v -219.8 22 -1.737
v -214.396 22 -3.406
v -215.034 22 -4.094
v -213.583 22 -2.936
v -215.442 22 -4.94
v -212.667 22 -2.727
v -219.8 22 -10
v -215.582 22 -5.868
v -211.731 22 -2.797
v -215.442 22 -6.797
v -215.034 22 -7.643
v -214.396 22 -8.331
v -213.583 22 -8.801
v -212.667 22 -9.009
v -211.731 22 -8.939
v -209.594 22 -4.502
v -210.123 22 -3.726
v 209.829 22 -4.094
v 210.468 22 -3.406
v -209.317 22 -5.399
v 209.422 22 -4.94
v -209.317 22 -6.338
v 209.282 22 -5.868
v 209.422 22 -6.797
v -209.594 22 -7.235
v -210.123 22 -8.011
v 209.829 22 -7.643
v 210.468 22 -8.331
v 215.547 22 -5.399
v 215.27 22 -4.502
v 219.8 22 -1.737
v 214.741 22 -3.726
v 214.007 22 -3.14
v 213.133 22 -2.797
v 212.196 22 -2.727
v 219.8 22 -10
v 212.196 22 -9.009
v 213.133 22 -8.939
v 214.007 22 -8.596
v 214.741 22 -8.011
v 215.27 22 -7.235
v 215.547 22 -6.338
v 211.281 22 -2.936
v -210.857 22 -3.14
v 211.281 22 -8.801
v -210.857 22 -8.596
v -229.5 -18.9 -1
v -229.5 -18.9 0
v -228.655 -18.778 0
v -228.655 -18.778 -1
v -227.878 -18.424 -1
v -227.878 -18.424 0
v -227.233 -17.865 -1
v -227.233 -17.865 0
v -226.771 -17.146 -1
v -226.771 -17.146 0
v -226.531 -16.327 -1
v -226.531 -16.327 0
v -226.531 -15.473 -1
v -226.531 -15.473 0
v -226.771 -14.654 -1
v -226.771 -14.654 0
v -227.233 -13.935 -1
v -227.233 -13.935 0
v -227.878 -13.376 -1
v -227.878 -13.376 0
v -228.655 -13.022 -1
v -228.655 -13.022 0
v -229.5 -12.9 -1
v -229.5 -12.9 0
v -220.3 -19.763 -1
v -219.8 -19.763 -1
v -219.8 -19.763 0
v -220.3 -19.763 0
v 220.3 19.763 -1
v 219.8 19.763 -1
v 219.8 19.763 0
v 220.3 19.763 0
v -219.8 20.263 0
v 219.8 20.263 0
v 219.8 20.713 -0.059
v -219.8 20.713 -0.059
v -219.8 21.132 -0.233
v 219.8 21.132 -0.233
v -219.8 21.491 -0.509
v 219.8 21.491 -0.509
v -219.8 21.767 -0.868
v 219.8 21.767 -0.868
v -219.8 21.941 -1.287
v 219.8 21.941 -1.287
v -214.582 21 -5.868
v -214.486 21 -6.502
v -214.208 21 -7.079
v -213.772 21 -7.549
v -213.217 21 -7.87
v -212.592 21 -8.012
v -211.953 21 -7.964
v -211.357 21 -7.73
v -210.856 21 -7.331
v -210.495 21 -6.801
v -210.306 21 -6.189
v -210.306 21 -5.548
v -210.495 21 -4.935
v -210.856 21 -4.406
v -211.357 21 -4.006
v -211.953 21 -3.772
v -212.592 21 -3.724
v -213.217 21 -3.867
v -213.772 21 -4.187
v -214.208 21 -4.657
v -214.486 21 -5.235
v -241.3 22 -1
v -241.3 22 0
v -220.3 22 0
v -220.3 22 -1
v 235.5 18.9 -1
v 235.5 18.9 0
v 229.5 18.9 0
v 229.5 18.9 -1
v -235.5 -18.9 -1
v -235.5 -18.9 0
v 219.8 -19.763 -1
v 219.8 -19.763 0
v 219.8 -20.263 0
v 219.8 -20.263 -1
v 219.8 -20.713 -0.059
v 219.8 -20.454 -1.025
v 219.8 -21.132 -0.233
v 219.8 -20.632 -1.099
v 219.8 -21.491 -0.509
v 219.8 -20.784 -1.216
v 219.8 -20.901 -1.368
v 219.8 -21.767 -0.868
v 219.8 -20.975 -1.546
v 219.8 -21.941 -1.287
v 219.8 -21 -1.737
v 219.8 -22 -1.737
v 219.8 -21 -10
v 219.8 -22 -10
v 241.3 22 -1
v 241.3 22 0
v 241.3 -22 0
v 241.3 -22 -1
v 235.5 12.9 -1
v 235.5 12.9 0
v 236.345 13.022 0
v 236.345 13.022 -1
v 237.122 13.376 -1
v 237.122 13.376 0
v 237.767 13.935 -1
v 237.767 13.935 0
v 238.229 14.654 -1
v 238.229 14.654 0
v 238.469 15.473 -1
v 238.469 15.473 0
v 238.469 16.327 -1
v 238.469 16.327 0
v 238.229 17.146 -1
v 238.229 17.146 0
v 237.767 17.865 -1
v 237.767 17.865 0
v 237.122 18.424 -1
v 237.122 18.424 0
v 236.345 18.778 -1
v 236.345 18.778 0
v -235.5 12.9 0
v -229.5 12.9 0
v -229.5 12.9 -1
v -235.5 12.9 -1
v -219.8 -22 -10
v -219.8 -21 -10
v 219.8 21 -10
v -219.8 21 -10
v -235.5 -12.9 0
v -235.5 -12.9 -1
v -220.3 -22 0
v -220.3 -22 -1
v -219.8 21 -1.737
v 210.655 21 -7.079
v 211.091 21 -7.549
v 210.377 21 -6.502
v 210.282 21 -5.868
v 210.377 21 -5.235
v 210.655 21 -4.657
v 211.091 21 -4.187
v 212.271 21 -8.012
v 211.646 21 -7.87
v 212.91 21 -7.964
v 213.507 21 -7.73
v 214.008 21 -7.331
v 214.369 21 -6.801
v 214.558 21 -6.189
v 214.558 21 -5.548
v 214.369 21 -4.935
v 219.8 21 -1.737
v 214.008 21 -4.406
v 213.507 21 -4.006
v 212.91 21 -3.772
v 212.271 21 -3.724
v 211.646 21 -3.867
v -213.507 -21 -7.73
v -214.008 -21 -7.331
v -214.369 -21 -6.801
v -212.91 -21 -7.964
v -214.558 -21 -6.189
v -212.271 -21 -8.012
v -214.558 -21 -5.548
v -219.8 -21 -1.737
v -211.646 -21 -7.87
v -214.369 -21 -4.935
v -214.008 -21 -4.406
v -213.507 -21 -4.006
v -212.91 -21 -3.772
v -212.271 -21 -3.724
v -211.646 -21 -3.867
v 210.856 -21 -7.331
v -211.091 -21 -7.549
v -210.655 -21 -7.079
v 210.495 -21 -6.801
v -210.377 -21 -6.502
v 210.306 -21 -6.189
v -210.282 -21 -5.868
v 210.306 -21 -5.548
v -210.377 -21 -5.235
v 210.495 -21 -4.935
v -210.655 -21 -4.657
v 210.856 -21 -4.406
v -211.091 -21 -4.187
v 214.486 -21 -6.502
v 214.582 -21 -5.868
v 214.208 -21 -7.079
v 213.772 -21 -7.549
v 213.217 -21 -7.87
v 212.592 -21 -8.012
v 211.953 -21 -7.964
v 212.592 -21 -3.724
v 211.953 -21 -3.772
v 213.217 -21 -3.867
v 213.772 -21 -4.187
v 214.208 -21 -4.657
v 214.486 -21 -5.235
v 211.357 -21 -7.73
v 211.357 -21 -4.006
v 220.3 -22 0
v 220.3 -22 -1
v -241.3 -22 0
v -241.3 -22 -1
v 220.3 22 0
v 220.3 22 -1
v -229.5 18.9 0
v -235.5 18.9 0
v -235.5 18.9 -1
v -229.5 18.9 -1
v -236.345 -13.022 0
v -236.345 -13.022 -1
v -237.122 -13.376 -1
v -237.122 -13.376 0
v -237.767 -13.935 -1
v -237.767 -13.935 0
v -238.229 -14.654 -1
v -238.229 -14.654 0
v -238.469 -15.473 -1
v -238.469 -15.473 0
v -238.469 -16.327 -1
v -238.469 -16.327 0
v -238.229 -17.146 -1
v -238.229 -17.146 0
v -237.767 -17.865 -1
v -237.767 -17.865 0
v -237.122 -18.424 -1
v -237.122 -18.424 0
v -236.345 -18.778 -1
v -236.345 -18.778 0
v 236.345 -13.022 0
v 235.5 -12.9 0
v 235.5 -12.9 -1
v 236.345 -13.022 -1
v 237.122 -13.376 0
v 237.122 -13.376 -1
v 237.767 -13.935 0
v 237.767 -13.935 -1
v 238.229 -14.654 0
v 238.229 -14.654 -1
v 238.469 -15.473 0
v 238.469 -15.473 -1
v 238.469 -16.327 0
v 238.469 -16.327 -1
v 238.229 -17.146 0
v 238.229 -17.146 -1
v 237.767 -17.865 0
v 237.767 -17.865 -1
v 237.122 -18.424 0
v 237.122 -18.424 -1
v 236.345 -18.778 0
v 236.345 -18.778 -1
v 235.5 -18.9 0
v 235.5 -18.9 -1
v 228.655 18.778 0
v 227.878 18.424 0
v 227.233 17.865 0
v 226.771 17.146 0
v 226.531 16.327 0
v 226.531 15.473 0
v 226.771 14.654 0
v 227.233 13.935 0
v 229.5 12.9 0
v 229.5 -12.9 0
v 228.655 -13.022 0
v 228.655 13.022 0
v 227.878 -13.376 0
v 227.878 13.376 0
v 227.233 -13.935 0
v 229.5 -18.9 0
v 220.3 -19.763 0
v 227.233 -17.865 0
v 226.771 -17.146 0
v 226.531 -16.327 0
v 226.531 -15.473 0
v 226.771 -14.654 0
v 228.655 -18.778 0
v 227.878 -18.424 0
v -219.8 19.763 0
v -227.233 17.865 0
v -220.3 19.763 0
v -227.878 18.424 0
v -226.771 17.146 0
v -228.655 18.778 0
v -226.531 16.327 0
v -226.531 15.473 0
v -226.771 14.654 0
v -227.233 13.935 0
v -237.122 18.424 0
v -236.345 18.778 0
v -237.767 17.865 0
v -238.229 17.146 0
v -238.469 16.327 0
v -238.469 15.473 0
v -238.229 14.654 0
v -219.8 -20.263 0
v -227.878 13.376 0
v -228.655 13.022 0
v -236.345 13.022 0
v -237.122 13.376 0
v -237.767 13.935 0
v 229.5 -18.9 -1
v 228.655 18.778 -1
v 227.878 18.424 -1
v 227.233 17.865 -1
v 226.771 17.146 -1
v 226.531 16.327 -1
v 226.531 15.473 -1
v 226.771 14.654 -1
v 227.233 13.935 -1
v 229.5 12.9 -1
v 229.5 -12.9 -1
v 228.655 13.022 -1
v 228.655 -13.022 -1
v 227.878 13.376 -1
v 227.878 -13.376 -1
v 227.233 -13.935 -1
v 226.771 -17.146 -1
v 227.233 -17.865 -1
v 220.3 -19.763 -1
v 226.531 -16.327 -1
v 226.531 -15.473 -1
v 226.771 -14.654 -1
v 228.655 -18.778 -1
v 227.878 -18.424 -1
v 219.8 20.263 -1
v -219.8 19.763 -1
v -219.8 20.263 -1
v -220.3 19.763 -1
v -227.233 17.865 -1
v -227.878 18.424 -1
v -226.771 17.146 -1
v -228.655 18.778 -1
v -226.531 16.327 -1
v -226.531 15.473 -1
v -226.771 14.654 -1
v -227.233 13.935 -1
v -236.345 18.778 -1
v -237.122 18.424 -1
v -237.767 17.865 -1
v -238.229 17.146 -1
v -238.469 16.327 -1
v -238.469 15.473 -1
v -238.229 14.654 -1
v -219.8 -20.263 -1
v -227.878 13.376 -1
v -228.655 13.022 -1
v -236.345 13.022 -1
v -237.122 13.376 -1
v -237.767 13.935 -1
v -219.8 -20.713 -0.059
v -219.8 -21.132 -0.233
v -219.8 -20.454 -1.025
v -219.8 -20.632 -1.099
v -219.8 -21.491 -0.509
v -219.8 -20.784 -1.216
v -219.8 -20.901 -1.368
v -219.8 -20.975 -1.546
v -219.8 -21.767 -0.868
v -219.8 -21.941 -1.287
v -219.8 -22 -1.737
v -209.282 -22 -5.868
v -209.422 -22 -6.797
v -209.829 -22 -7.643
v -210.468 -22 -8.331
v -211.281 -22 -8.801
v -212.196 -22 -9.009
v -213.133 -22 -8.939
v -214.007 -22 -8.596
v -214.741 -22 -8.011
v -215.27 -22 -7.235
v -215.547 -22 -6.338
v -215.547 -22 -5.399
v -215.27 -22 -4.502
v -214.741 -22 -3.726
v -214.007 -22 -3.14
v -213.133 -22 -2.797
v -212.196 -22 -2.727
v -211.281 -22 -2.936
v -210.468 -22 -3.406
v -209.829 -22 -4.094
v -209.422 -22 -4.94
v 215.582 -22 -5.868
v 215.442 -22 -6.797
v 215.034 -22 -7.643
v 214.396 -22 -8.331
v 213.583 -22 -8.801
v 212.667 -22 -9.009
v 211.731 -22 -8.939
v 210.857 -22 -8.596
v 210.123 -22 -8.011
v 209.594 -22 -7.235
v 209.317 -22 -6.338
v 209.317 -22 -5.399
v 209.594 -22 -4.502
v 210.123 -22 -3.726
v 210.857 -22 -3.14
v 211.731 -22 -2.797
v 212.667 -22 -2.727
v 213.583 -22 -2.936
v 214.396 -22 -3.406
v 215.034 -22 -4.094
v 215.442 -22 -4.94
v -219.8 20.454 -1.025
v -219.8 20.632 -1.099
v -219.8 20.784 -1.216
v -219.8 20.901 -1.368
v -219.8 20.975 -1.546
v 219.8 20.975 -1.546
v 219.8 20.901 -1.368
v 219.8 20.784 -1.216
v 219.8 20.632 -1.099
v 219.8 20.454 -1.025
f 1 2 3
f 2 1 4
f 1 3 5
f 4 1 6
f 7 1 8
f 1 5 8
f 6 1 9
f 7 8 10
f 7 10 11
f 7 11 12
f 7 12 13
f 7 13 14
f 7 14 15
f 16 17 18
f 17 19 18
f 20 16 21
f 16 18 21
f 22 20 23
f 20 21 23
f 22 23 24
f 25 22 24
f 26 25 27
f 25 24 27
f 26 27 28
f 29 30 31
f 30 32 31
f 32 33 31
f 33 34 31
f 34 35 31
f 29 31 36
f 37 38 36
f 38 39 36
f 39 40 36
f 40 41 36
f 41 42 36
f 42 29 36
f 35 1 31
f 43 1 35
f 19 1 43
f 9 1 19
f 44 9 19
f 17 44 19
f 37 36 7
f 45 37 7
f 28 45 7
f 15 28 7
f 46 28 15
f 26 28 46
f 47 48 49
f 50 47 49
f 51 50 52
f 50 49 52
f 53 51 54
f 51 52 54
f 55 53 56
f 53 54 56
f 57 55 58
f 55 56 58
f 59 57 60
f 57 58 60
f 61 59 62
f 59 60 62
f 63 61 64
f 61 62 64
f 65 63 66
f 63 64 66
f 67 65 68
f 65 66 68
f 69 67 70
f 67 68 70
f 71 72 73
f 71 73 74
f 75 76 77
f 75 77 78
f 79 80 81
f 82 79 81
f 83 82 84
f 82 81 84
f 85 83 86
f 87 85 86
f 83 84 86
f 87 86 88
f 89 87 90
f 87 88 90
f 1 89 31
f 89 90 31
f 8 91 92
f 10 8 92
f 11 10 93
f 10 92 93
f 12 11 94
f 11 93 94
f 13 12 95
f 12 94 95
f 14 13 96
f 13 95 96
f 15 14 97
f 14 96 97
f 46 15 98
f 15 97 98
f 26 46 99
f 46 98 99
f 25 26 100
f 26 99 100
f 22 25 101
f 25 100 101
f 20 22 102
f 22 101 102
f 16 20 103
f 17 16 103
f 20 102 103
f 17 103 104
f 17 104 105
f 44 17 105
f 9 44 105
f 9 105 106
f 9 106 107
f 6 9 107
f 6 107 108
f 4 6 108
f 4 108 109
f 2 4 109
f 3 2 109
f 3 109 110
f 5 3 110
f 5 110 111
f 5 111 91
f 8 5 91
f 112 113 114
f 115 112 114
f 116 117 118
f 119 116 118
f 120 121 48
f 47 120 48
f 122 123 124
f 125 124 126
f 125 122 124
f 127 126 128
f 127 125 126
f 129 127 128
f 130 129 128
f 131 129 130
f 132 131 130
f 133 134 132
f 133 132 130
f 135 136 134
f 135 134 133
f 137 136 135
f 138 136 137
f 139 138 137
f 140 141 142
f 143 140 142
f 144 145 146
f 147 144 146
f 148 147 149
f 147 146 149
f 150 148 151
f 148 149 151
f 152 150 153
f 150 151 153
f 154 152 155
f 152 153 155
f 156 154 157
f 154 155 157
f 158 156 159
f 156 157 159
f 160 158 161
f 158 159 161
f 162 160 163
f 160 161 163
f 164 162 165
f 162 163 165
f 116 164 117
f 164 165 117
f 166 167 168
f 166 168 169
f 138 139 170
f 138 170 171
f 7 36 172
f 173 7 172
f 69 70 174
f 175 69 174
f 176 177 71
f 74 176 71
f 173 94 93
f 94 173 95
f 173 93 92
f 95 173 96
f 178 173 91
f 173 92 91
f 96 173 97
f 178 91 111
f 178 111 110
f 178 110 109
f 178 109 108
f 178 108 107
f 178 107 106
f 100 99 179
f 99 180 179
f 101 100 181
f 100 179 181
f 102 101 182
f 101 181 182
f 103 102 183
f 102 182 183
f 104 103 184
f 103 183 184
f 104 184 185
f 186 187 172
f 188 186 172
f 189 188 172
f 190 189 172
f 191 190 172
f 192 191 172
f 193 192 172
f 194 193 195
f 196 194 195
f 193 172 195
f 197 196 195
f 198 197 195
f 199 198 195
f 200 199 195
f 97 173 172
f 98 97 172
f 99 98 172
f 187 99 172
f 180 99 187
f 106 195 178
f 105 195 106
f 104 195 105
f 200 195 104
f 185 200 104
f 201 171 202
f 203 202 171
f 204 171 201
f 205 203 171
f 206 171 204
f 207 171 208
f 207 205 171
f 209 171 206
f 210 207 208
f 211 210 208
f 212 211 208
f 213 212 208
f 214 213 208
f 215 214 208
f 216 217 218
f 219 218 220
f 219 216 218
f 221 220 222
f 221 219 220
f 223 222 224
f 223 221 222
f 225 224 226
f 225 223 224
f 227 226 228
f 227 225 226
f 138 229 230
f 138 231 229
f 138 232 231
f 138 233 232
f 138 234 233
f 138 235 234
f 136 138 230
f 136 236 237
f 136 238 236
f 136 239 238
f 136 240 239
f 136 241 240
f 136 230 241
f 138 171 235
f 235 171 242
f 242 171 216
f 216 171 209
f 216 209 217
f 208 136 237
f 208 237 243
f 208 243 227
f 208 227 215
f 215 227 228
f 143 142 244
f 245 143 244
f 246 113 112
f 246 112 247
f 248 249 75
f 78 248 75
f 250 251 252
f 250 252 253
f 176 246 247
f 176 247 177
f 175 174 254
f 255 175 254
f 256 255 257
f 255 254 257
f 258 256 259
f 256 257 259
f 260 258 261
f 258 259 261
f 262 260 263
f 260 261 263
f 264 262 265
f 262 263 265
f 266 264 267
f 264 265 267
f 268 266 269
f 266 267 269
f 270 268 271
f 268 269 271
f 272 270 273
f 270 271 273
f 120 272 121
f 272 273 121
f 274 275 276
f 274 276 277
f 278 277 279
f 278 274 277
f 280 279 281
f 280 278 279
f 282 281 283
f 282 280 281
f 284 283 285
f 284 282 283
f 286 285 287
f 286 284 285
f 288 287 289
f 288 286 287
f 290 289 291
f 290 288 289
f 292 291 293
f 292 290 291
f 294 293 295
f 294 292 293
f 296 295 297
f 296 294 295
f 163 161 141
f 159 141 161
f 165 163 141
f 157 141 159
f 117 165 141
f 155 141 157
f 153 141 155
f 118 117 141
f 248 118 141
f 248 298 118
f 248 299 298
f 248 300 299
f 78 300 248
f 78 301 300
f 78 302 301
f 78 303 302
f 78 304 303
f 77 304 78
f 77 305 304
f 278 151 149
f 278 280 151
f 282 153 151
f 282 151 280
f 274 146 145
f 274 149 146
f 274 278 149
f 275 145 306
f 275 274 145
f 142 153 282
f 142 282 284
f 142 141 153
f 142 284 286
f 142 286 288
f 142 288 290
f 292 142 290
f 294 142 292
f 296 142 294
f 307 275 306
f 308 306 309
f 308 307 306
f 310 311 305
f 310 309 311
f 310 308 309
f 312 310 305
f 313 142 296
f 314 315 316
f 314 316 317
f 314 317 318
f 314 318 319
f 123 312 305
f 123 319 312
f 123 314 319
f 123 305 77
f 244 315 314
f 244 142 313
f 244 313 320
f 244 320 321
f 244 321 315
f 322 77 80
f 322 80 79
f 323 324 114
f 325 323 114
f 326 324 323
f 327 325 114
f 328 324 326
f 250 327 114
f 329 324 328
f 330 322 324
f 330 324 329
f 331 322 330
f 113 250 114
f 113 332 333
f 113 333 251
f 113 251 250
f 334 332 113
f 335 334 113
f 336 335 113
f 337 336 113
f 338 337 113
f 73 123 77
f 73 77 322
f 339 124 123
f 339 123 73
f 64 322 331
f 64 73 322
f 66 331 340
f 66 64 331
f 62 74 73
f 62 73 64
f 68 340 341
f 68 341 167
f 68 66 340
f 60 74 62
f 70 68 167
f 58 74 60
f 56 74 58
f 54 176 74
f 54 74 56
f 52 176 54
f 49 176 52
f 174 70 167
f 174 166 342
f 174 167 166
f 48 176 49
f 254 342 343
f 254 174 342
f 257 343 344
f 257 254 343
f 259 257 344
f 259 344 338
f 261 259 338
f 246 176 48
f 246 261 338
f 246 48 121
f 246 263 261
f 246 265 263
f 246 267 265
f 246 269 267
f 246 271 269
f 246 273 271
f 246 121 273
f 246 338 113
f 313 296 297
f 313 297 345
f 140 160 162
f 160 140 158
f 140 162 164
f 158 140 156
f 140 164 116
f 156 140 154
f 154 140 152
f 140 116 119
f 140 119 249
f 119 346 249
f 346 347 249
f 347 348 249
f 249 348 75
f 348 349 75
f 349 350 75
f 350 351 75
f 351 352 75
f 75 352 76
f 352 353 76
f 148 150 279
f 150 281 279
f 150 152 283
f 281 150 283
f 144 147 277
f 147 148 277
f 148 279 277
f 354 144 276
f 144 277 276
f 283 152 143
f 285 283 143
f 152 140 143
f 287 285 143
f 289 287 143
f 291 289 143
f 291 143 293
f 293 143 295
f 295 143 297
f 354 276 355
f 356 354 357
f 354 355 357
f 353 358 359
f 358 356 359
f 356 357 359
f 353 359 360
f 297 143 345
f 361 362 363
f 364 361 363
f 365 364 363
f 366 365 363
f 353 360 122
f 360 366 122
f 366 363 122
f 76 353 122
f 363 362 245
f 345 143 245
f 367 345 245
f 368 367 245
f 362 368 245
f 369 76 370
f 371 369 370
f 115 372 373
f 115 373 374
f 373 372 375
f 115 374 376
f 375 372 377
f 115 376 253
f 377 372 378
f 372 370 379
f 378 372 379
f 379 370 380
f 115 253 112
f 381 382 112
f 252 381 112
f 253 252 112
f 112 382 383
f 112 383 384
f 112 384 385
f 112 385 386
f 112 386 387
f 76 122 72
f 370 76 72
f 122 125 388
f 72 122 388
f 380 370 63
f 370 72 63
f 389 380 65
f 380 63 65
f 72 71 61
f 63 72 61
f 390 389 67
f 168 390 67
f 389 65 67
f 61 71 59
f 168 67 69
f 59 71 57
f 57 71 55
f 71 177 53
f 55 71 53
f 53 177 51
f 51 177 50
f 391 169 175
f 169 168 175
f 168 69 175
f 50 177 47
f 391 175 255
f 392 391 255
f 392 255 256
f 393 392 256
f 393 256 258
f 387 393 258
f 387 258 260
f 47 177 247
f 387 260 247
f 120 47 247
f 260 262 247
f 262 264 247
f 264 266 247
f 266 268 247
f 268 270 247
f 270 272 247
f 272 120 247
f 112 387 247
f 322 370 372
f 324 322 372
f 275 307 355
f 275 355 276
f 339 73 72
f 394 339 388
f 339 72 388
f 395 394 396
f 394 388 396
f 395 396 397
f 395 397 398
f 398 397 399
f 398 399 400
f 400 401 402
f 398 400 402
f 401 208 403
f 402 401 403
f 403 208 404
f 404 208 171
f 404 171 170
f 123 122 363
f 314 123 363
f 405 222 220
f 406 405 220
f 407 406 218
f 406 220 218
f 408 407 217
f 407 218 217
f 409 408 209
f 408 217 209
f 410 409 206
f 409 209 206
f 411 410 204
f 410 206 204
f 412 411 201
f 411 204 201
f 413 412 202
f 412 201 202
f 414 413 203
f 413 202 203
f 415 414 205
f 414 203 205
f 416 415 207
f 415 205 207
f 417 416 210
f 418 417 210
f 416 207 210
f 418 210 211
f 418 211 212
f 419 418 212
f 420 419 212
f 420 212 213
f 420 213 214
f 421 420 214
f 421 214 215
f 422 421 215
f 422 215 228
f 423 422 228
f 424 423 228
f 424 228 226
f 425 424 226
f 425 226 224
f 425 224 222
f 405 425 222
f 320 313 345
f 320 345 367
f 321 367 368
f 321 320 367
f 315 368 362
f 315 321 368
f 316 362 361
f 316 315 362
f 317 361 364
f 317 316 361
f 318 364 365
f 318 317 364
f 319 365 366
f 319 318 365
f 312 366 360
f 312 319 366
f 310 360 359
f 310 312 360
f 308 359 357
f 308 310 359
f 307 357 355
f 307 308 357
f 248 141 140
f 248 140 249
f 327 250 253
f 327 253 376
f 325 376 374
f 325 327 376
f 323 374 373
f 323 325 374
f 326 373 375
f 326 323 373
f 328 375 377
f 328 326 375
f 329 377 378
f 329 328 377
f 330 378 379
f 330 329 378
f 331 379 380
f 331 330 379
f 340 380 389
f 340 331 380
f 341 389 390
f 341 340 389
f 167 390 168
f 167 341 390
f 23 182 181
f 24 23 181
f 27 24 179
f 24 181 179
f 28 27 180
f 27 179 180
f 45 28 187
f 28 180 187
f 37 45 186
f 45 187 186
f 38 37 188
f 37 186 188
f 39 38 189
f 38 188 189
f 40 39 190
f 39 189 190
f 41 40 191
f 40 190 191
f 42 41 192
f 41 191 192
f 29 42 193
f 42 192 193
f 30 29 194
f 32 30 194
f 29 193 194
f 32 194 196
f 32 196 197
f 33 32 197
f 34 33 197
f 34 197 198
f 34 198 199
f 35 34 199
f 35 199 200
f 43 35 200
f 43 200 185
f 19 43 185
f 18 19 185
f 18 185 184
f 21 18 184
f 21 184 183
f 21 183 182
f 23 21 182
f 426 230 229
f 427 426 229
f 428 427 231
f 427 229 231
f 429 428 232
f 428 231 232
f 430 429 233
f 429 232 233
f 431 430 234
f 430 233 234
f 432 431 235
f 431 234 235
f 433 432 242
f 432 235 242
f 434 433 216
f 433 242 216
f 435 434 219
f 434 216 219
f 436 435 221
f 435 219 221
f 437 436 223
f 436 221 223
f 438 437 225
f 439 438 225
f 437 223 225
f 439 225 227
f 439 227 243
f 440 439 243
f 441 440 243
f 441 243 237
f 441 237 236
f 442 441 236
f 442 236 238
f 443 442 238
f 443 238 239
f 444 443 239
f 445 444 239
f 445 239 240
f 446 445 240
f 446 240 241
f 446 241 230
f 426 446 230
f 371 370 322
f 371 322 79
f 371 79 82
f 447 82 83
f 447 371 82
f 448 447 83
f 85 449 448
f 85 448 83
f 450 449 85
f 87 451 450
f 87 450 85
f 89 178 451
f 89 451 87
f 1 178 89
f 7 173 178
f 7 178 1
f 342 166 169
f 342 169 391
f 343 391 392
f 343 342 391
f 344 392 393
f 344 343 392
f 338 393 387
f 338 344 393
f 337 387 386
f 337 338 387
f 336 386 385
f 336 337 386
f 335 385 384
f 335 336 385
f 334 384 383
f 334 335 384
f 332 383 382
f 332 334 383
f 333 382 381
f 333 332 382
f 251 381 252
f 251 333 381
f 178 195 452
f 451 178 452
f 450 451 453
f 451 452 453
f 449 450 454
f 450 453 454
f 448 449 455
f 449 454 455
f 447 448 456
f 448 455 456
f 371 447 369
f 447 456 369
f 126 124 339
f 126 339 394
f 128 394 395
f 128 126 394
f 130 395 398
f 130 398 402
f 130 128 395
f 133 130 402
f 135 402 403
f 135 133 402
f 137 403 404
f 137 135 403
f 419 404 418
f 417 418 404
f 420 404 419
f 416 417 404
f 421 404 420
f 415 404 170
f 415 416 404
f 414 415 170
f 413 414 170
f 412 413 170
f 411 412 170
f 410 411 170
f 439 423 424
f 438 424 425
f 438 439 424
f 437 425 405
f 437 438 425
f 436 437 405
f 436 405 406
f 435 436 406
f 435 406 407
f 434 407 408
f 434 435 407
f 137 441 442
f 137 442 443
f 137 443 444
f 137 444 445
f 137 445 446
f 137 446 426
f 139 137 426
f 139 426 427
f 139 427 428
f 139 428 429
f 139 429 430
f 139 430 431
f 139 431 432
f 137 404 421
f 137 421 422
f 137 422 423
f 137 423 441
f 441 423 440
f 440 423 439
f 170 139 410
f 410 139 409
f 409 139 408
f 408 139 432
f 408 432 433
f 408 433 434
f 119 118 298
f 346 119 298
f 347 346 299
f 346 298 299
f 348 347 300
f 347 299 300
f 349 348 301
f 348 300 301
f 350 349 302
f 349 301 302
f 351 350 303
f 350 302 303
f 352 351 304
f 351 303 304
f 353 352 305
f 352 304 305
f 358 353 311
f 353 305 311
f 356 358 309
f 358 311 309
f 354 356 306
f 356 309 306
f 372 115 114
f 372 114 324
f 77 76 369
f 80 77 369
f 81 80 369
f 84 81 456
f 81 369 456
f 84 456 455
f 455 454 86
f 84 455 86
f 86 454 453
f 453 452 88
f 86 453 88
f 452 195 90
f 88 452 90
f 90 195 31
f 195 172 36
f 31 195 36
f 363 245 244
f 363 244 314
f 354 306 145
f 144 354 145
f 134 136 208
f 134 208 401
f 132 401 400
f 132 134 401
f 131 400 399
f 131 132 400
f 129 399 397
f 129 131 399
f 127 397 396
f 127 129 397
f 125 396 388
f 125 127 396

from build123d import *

# Parameters (mm, degrees)
SKETCH1_W                                           = 241.3
SKETCH1_H                                           = 22
BASE_FLANGE_DEPTH                                   = 1
EDGE_FLANGE_MOUNING_STRIP_W                         = 5.4732
EDGE_FLANGE_MOUNING_STRIP_H                         = 1
EDGE_FLANGE_MOUNING_STRIP_CUT_DEPTH                 = 219.8
EDGE_FLANGE_MOUNING_RELIEF_W                        = 5.9732
EDGE_FLANGE_MOUNING_RELIEF_H                        = 0.5
EDGE_FLANGE_MOUNING_RELIEF_CUT_DEPTH                = 1
EDGE_FLANGE_MOUNING_DEPTH                           = 219.8
CUT_EXTRUDE_MOUNTING_DEPTH                          = 1
CSK_FOR_M3_COUNTERSUNK_FLAT_HEAD_SCREW5_D           = 3.2
CSK_FOR_M3_COUNTERSUNK_FLAT_HEAD_SCREW5_CSINK_D     = 6.3
CSK_FOR_M3_COUNTERSUNK_FLAT_HEAD_SCREW5_CSINK_ANGLE = 90
CSK_FOR_M3_COUNTERSUNK_FLAT_HEAD_SCREW6_D           = 3.2
CSK_FOR_M3_COUNTERSUNK_FLAT_HEAD_SCREW6_CSINK_D     = 6.3
CSK_FOR_M3_COUNTERSUNK_FLAT_HEAD_SCREW6_CSINK_ANGLE = 90


# Sheet-metal steps are written as plain solids
with BuildPart() as part:
    # Sketch1 → Base-Flange (new body)
    with BuildSketch(Plane.XY):
        with Locations((-120.65, 11)):
            Rectangle(SKETCH1_W, SKETCH1_H)
    extrude(amount=-BASE_FLANGE_DEPTH)

    # Edge-Flange-Mouning strip (across the edge) → Edge-Flange-Mouning strip cut (cut)
    with BuildSketch(Plane(origin=(-219.8, 22, -1), x_dir=(0, -1, 0), z_dir=(1, 0, 0))):
        with Locations((-1, -0.5)):
            Rectangle(EDGE_FLANGE_MOUNING_STRIP_W, EDGE_FLANGE_MOUNING_STRIP_H)
    extrude(amount=EDGE_FLANGE_MOUNING_STRIP_CUT_DEPTH, mode=Mode.SUBTRACT)

    # Edge-Flange-Mouning relief (on the sheet) → Edge-Flange-Mouning relief cut (cut)
    with BuildSketch(Plane(origin=(-219.8, 20.2634, -1), x_dir=(0, -1, 0), z_dir=(0, 0, -1))):
        with Locations((-2.4866, 0.25)):
            Rectangle(EDGE_FLANGE_MOUNING_RELIEF_W, EDGE_FLANGE_MOUNING_RELIEF_H)
    extrude(amount=-EDGE_FLANGE_MOUNING_RELIEF_CUT_DEPTH, mode=Mode.SUBTRACT)

    # Edge-Flange-Mouning section (across the edge) → Edge-Flange-Mouning (add)
    with BuildSketch(Plane(origin=(-219.8, 22, -1), x_dir=(0, -1, 0), z_dir=(1, 0, 0))):
        with BuildLine():
            Line((0, 0.7366), (0, 9))
            Line((0, 9), (1, 9))
            Line((1, 9), (1, 0.7366))
            ThreePointArc((1, 0.7366), (1.215745145, 0.215745145), (1.7366, 0))
            Line((1.7366, 0), (1.7366, -1))
            ThreePointArc((1.7366, -1), (0.508638364, -0.491361636), (0, 0.7366))
        make_face()
    extrude(amount=EDGE_FLANGE_MOUNING_DEPTH)

    # Sketch13 → Cut-Extrude-Mounting (cut)
    with BuildSketch(Plane.XY):
        with BuildLine():
            Line((-229.5, 12.9), (-235.5, 12.9))
            ThreePointArc((-235.5, 12.9), (-238.5, 15.9), (-235.5, 18.9))
            Line((-235.5, 18.9), (-229.5, 18.9))
            ThreePointArc((-229.5, 18.9), (-226.5, 15.9), (-229.5, 12.9))
        make_face()
    extrude(amount=-CUT_EXTRUDE_MOUNTING_DEPTH, mode=Mode.SUBTRACT)

    # Mirror-Vertical: part across plane


with BuildPart() as part_1:
    add(part.part)
    add(part.part.mirror(Plane(origin=(0, 0, -1), x_dir=(0, 0, 1), z_dir=(1, 0, 0))))

    # Mirror-Horizontal: part across face


with BuildPart() as part_2:
    add(part_1.part)
    add(part_1.part.mirror(Plane(origin=(0, 0, -0.5), x_dir=(0, 0, 1), z_dir=(0, -1, 0))))

    # CSK for M3 Countersunk Flat Head Screw5 (through all)
    with Locations(Plane(origin=(0, 22, 0), x_dir=(1, 0, 0), z_dir=(0, 1, 0))):
        with Locations((-212.4317, 5.8683), (212.4317, 5.8683)):
            CounterSinkHole(CSK_FOR_M3_COUNTERSUNK_FLAT_HEAD_SCREW5_D / 2, CSK_FOR_M3_COUNTERSUNK_FLAT_HEAD_SCREW5_CSINK_D / 2, counter_sink_angle=CSK_FOR_M3_COUNTERSUNK_FLAT_HEAD_SCREW5_CSINK_ANGLE)

    # CSK for M3 Countersunk Flat Head Screw6 (through all)
    with Locations(Plane(origin=(0, -22, 0), x_dir=(-1, 0, 0), z_dir=(0, -1, 0))):
        with Locations((-212.4317, 5.8683), (212.4317, 5.8683)):
            CounterSinkHole(CSK_FOR_M3_COUNTERSUNK_FLAT_HEAD_SCREW6_D / 2, CSK_FOR_M3_COUNTERSUNK_FLAT_HEAD_SCREW6_CSINK_D / 2, counter_sink_angle=CSK_FOR_M3_COUNTERSUNK_FLAT_HEAD_SCREW6_CSINK_ANGLE)


solid = part_2.part
